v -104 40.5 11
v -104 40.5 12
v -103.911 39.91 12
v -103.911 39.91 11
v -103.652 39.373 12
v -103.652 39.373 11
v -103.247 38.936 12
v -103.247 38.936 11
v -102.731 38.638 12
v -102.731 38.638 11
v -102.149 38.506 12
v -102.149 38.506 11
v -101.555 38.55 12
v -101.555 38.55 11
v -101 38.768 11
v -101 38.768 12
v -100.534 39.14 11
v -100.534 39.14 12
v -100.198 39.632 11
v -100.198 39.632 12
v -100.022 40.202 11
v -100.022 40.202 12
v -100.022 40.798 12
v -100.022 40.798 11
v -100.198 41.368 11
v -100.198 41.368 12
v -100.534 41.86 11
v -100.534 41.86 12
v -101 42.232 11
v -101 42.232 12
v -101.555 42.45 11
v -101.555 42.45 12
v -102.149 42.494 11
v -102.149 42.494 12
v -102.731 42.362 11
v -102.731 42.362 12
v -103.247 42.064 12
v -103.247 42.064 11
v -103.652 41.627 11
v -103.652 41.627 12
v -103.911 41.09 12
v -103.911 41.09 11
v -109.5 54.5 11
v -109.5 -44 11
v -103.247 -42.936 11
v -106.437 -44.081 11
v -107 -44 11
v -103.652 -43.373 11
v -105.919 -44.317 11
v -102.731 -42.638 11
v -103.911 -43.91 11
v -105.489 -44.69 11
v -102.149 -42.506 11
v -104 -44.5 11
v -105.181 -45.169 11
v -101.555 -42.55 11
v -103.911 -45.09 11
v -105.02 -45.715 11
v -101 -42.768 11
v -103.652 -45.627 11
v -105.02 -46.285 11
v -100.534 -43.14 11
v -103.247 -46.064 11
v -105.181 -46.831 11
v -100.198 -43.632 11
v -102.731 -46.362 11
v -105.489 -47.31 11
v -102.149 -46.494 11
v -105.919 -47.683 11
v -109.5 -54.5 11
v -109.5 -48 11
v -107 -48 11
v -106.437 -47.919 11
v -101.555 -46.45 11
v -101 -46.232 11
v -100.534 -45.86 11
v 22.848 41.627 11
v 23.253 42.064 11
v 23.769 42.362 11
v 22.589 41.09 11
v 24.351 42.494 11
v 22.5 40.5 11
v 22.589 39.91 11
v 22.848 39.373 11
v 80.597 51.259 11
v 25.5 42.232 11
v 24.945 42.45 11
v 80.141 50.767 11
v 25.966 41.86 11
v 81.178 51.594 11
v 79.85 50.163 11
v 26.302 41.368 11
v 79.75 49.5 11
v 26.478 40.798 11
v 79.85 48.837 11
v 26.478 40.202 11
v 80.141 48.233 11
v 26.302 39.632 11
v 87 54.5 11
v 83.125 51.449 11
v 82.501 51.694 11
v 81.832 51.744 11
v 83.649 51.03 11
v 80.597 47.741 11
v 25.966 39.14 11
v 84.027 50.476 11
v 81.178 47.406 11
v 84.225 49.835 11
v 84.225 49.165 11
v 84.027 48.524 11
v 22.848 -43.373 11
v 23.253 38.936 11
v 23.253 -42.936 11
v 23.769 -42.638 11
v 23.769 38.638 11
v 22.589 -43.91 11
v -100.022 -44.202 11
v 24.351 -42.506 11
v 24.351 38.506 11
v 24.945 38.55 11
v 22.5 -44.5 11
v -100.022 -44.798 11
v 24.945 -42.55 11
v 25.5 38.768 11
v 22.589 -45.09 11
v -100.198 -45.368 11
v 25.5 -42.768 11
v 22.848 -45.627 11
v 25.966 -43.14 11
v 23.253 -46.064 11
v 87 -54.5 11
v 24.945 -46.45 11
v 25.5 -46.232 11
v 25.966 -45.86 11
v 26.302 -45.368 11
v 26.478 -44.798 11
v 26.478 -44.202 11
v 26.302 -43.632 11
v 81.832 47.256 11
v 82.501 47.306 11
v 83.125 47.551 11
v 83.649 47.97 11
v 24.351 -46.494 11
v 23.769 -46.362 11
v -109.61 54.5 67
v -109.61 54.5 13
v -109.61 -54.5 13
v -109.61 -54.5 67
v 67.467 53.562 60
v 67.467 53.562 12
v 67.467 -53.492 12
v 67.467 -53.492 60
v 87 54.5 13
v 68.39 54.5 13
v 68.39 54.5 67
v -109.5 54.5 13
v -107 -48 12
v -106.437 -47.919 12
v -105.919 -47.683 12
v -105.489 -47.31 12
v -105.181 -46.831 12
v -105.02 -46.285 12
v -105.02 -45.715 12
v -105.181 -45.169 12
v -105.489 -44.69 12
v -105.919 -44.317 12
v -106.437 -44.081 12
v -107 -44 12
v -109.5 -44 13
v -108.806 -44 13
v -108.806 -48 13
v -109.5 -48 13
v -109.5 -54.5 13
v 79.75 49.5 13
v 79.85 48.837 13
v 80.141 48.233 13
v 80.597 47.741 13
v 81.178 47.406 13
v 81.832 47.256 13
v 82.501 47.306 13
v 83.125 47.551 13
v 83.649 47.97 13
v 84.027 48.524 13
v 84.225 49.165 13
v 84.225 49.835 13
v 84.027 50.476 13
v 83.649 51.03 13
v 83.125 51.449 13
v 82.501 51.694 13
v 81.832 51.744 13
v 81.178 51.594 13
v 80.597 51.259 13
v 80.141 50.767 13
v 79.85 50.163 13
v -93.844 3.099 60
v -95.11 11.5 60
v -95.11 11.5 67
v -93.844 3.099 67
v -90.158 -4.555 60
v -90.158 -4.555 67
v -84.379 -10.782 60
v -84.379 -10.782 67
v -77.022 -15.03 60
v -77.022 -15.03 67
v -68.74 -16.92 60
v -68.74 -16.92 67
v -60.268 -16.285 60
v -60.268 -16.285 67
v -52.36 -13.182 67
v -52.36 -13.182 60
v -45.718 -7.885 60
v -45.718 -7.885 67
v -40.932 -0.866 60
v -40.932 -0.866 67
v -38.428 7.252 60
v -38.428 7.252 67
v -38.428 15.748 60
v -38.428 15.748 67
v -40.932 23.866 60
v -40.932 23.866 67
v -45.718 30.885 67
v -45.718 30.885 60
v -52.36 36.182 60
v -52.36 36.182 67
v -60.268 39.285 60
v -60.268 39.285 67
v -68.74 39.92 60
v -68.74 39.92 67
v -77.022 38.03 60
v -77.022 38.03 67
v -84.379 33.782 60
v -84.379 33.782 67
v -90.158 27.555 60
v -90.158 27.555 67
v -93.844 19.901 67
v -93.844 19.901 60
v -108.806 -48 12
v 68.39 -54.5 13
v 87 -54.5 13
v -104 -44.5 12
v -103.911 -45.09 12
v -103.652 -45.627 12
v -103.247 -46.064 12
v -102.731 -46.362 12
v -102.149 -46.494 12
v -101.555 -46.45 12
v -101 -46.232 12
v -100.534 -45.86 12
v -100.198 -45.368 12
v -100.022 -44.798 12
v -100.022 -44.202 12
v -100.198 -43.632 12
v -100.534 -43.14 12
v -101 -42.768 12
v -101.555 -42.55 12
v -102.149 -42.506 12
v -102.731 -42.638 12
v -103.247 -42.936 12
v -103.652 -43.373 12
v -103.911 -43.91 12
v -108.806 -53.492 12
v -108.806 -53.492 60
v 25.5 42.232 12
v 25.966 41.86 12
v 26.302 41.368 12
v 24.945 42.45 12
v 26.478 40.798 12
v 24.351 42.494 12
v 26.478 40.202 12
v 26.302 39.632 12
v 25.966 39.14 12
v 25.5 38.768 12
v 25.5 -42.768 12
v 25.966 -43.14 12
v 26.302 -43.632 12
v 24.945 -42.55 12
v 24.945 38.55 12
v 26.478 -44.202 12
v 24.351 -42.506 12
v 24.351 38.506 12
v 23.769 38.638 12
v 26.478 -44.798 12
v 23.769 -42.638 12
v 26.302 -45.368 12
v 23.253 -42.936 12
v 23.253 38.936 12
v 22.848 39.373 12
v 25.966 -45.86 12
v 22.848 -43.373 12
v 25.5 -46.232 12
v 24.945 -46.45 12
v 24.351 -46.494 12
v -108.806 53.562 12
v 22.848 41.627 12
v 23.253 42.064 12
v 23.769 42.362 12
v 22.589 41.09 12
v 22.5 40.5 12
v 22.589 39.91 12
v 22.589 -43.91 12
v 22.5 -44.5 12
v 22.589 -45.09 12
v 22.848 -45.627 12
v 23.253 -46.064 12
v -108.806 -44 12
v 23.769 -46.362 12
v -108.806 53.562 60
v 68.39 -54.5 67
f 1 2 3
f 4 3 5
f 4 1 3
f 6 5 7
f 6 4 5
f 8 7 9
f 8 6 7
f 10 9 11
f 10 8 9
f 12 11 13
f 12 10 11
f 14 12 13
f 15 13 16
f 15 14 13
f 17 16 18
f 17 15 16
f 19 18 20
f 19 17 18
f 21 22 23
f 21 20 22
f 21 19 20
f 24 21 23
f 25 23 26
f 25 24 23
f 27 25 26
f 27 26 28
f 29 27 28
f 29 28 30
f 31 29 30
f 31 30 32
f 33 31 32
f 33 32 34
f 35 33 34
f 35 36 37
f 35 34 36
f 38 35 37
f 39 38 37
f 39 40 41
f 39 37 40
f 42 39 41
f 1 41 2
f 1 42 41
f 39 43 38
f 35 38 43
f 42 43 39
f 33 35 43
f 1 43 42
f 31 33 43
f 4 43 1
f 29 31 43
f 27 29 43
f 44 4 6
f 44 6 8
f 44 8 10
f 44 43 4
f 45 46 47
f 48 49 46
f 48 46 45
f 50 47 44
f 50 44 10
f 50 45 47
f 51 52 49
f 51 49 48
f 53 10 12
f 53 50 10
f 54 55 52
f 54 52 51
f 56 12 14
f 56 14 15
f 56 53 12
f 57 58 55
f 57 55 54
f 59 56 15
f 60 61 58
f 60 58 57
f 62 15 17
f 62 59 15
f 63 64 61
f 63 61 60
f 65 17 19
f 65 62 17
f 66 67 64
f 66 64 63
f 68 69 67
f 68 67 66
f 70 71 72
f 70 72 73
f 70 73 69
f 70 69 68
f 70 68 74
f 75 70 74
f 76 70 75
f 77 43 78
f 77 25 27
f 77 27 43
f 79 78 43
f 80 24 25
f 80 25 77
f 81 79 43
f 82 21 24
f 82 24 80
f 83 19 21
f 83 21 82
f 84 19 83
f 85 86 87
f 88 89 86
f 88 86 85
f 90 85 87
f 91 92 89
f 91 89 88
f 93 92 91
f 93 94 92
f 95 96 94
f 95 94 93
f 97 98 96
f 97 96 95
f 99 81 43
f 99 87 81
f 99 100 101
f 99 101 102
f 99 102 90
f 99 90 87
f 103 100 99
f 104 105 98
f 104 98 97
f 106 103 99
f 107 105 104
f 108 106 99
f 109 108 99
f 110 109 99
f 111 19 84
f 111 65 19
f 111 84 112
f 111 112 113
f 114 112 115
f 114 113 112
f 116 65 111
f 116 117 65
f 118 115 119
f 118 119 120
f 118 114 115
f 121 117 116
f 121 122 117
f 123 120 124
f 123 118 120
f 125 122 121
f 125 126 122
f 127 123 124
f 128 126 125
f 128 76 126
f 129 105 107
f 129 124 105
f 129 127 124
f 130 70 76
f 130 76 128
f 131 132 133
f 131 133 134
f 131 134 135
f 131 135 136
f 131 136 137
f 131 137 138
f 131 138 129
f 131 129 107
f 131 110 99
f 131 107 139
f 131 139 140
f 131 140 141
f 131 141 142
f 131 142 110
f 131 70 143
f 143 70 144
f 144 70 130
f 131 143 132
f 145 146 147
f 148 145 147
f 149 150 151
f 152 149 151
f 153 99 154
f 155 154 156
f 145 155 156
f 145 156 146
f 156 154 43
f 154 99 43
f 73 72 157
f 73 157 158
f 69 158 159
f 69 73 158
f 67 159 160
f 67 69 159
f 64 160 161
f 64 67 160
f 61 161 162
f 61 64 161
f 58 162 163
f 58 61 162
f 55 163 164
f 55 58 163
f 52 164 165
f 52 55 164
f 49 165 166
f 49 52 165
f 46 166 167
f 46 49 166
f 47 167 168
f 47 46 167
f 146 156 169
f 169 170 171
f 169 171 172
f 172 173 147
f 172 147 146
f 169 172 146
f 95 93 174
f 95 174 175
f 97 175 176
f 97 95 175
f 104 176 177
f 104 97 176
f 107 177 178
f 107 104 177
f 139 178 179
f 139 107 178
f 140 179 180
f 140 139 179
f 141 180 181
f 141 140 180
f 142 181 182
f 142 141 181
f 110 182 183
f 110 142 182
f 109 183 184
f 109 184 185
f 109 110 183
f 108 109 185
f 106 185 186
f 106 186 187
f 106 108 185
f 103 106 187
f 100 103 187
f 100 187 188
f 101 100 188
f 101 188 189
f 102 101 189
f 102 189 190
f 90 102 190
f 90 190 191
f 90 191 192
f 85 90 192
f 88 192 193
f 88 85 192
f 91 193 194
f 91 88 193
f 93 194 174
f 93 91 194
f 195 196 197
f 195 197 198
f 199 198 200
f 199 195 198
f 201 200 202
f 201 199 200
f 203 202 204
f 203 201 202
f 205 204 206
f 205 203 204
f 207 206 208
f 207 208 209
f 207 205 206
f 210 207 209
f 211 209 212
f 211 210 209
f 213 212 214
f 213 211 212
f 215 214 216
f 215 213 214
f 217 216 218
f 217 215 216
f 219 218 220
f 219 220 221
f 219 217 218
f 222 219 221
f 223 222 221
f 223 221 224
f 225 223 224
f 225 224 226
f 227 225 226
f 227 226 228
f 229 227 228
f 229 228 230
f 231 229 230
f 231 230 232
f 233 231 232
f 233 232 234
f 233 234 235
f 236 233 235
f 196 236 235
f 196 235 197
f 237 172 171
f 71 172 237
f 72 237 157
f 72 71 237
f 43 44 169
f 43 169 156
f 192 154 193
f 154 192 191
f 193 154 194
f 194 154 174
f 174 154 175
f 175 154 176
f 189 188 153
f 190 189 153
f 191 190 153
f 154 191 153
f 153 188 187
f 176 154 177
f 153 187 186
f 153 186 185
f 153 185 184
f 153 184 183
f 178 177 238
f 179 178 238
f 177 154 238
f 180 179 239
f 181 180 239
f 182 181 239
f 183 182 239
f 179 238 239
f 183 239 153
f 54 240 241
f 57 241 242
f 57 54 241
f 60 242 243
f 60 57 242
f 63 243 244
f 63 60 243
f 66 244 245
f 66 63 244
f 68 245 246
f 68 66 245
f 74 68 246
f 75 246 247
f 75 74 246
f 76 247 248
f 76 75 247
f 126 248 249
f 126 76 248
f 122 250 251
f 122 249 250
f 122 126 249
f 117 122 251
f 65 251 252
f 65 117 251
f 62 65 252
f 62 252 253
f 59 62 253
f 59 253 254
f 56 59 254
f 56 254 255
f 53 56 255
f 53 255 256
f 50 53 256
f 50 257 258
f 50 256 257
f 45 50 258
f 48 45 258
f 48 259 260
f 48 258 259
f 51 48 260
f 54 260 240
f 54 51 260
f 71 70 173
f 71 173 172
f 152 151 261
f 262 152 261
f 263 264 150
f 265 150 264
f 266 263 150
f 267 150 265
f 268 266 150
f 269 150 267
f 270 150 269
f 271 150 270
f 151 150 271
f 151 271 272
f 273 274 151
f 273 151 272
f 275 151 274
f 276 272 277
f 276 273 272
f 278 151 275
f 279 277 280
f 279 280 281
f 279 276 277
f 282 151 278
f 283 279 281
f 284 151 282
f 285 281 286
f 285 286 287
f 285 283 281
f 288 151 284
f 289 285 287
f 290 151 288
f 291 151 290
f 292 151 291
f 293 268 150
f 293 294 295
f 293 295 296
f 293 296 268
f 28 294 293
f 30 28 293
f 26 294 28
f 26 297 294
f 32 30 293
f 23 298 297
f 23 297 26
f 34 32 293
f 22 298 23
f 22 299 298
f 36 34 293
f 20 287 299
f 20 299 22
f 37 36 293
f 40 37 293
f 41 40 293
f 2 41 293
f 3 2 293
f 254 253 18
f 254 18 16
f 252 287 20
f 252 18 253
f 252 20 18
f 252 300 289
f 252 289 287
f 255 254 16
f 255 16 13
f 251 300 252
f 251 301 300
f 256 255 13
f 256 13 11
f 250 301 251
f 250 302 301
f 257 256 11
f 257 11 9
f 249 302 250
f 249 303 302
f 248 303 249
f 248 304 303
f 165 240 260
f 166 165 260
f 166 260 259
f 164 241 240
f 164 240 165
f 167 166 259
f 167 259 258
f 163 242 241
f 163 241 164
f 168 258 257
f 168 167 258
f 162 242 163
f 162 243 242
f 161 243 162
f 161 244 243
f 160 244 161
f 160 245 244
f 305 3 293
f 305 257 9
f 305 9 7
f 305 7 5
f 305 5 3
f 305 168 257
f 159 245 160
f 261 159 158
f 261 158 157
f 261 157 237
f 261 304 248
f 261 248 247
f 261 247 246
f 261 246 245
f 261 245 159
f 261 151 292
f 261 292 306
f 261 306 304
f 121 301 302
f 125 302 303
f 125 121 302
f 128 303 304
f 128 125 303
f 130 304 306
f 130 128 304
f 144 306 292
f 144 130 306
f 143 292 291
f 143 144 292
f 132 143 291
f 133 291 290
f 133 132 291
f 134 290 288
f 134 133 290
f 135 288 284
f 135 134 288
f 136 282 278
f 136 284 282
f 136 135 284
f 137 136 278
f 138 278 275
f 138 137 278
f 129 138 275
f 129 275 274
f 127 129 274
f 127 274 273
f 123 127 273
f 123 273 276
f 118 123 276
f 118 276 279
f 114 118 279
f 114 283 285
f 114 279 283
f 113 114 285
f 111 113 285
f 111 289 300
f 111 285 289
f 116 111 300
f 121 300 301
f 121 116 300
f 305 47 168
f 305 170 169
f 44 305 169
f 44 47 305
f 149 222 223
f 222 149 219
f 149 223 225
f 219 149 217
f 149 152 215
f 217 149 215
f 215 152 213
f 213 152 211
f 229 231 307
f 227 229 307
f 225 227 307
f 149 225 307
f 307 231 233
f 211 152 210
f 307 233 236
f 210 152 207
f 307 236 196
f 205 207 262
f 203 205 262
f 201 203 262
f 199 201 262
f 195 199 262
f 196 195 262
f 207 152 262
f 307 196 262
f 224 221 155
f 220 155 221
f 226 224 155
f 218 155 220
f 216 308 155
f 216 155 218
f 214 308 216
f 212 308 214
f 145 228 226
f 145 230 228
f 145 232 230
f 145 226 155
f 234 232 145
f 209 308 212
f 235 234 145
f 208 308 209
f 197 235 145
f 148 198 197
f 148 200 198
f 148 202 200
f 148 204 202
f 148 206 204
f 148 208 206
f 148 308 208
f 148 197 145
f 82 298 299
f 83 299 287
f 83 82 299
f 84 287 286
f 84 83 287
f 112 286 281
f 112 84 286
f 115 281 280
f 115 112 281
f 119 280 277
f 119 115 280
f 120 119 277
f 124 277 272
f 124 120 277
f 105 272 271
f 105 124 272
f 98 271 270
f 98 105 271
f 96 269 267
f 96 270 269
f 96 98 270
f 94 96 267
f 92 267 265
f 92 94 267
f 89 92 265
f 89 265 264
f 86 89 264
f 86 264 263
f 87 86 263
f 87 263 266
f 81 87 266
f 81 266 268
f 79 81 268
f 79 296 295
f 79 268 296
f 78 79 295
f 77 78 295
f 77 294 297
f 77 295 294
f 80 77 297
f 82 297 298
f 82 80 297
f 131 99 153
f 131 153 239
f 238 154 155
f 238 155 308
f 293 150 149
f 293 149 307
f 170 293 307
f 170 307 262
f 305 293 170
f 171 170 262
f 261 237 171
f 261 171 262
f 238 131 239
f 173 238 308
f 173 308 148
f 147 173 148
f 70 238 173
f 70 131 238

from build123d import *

# Parameters (mm, degrees)
SKETCH005_R             = 2.25
SKETCH005_R_2           = 2
PAD003_DEPTH            = 2
SKETCH007_W             = 178
SKETCH007_H             = 109
SKETCH007_R             = 28.5
PAD005_DEPTH            = 54
SKETCH008_W             = 176.272423
SKETCH008_H             = 107.053562
POCKET001_DEPTH         = 48
BODY001_PLACEMENT_ANGLE = 180


with BuildPart() as part:
    # Sketch005 → Pad003 (new body)
    with BuildSketch(Plane.XY.offset(13)):
        with BuildLine():
            Line((-98.25, -54.5), (-98.25, 54.5))
            Line((-98.25, 54.5), (98.25, 54.5))
            Line((98.25, 54.5), (98.25, 48))
            Line((98.25, 48), (95.75, 48))
            ThreePointArc((95.75, 48), (93.75, 46), (95.75, 44))
            Line((95.75, 44), (98.25, 44))
            Line((98.25, 44), (98.25, -54.5))
            Line((98.25, -54.5), (-98.25, -54.5))
        make_face()
        with Locations((-93.25, -49.5)):
            Circle(SKETCH005_R, mode=Mode.SUBTRACT)
        with Locations((-35.75, 44.5)):
            Circle(SKETCH005_R_2, mode=Mode.SUBTRACT)
        with Locations((90.75, 44.5)):
            Circle(SKETCH005_R_2, mode=Mode.SUBTRACT)
        with Locations((90.75, -40.5)):
            Circle(SKETCH005_R_2, mode=Mode.SUBTRACT)
        with Locations((-35.75, -40.5)):
            Circle(SKETCH005_R_2, mode=Mode.SUBTRACT)
    extrude(amount=PAD003_DEPTH)

    # Sketch007 (on Face15 of Pad003) → Pad005 (join)
    with BuildSketch(Plane.XY.offset(15)):
        with Locations((9.36, 0)):
            Rectangle(SKETCH007_W, SKETCH007_H)
        with Locations((55.36, -11.5)):
            Circle(SKETCH007_R, mode=Mode.SUBTRACT)
    extrude(amount=PAD005_DEPTH)

    # Sketch008 (on Face5 of Pad005) → Pocket001 (cut)
    with BuildSketch(Plane.XY.offset(14)):
        with Locations((9.419559, -0.035154)):
            Rectangle(SKETCH008_W, SKETCH008_H)
    extrude(amount=POCKET001_DEPTH, mode=Mode.SUBTRACT)


with BuildPart() as part_1:
    # Body001 placement: moved
    add(part.part.moved(Location((-11.25, 0, -2))).rotate(Axis((-11.25, 0, -2), (0, 0, 1)), BODY001_PLACEMENT_ANGLE))


solid = part_1.part
